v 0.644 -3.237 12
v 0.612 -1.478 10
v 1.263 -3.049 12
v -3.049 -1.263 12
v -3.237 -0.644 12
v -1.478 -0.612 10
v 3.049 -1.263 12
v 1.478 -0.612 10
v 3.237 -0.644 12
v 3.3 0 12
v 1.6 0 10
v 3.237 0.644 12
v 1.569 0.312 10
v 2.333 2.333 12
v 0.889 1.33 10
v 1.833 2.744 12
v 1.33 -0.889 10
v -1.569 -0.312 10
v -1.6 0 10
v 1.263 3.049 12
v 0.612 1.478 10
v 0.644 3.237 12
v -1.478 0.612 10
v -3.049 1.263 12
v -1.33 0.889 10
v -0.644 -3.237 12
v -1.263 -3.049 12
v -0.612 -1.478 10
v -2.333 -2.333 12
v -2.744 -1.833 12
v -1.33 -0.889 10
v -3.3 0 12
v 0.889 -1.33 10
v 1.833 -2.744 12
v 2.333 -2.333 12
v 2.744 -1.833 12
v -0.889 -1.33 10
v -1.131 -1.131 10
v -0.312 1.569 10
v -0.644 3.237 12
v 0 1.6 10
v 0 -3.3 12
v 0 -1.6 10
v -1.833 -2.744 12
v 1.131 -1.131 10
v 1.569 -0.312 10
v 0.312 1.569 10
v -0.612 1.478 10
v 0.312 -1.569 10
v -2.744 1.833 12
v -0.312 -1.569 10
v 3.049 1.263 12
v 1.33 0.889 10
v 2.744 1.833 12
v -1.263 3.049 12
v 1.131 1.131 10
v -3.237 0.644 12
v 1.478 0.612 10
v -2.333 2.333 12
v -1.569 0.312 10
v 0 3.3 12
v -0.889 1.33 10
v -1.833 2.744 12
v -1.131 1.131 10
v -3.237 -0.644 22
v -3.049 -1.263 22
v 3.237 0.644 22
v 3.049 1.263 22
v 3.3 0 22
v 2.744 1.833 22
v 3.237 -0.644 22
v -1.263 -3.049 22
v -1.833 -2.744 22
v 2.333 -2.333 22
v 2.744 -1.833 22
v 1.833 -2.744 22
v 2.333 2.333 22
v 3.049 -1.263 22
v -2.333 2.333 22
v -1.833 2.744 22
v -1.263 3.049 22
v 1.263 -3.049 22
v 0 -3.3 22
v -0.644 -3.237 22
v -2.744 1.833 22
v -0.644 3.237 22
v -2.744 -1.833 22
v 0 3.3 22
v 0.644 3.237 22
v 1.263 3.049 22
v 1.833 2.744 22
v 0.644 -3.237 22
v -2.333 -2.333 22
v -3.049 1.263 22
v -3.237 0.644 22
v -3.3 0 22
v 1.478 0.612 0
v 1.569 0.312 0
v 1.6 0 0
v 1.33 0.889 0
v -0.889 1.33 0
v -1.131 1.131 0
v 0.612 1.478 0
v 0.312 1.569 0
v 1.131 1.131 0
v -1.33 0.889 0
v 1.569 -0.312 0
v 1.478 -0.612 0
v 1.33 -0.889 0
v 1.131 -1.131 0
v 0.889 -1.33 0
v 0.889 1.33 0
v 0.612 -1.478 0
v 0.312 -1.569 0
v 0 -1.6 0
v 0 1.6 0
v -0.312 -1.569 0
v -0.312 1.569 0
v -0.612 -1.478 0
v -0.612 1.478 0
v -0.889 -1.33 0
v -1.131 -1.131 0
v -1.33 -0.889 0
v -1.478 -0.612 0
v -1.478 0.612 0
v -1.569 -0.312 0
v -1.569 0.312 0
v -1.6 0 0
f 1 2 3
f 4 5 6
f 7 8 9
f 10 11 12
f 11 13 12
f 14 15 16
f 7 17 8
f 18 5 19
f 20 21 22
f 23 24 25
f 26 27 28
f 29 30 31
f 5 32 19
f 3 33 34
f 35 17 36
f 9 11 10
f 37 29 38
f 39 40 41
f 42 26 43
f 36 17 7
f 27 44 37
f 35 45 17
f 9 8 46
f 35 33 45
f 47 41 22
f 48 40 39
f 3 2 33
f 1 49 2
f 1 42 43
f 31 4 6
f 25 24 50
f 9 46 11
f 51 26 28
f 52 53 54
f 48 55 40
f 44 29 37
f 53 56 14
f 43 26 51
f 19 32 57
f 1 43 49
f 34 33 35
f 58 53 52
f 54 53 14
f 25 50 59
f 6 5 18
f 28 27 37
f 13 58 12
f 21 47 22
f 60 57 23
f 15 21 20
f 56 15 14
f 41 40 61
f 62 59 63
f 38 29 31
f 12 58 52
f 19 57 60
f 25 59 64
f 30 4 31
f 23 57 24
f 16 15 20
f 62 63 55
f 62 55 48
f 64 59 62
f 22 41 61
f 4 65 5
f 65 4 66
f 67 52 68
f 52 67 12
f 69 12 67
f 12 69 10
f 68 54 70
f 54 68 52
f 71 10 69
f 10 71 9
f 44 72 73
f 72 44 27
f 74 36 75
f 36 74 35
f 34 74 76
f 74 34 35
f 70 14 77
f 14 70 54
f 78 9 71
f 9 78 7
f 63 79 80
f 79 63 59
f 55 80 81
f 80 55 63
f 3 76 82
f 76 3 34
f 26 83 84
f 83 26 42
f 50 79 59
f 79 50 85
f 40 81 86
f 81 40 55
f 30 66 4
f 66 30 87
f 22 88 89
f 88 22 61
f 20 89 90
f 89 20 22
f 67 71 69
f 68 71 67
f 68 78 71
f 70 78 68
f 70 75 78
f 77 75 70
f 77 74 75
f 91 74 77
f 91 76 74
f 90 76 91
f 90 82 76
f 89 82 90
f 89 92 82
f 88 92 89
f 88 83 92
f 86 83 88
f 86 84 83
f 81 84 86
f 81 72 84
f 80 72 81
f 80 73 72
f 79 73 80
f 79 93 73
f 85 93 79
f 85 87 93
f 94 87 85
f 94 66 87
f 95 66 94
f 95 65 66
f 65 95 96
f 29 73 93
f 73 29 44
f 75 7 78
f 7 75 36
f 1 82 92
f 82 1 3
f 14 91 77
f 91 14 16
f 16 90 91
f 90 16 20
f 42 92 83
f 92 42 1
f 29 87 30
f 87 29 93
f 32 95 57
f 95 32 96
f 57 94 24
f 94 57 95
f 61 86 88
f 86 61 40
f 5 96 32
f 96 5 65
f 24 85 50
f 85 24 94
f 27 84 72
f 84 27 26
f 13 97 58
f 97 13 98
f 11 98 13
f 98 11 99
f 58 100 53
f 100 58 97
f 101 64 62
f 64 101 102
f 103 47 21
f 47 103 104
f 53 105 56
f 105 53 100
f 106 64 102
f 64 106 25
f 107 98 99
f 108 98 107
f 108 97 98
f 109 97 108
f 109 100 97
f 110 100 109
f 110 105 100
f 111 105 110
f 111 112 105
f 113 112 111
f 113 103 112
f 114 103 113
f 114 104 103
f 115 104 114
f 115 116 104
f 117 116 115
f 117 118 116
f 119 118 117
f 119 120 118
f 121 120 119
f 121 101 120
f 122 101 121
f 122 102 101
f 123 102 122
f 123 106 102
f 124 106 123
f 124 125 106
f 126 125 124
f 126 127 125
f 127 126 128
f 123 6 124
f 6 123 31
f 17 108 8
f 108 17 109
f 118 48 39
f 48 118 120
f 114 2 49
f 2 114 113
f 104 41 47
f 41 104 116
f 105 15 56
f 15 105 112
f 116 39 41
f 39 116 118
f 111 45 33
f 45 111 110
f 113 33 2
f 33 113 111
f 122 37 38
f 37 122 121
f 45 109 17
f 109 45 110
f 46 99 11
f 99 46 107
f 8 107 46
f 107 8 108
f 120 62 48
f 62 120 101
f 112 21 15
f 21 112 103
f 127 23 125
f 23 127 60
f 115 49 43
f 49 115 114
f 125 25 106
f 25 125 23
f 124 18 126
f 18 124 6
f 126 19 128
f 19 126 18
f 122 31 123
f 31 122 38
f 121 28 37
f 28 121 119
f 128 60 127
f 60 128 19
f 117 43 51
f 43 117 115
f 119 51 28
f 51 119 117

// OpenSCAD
/**
 * Martin Egli
 * 2021-11-01
 * M3 screw cut outs
 */

module m3ScrewCut(len = 10, loc_res = 32) {
    translate([0, 0, 0])
    cylinder(d = 3.2, h = len, $fn = loc_res);
}

module m3SinkHeadCut(len = 4, loc_res = 32) {
    translate([0, 0, 0])
    cylinder(d1 = 3.2, d2 = 6.6, h = 2, $fn = loc_res);
    translate([0, 0, 2])
    cylinder(d = 6.6, h = len, $fn = loc_res);
}
module m3CylinderHeadCut(len = 4, loc_res = 32) {
    translate([0, 0, 0])
    cylinder(d = 6, h = len, $fn = loc_res);
}

module m3ScrewSinkHeadCut(len = 4, loc_res = 32) {
    translate([0, 0, 0])
    m3ScrewCut(len, loc_res);
    translate([0, 0, len])
    m3SinkHeadCut(len, loc_res);
}

module m3NutCut() {
    translate([0, 0, 0])
    cylinder(d = 6.6, h = 4, $fn = 6);
}

module m3SinkHeadScewNutCut(len = 10, loc_res = 32) {
    translate([0, 0, len])
    m3SinkHeadCut(4, loc_res);
    m3ScrewCut(len+1, loc_res);
    m3NutCut();
}

module m3CylinderHeadScewNutCut(len = 10, loc_res = 32) {
    translate([0, 0, len])
    m3CylinderHeadCut(4, loc_res);
    m3ScrewCut(len+1, loc_res);
    m3NutCut();
}

//m3SinkHeadScewNutCut(20);
//m3CylinderHeadScewNutCut(15);
m3ScrewSinkHeadCut(10);
